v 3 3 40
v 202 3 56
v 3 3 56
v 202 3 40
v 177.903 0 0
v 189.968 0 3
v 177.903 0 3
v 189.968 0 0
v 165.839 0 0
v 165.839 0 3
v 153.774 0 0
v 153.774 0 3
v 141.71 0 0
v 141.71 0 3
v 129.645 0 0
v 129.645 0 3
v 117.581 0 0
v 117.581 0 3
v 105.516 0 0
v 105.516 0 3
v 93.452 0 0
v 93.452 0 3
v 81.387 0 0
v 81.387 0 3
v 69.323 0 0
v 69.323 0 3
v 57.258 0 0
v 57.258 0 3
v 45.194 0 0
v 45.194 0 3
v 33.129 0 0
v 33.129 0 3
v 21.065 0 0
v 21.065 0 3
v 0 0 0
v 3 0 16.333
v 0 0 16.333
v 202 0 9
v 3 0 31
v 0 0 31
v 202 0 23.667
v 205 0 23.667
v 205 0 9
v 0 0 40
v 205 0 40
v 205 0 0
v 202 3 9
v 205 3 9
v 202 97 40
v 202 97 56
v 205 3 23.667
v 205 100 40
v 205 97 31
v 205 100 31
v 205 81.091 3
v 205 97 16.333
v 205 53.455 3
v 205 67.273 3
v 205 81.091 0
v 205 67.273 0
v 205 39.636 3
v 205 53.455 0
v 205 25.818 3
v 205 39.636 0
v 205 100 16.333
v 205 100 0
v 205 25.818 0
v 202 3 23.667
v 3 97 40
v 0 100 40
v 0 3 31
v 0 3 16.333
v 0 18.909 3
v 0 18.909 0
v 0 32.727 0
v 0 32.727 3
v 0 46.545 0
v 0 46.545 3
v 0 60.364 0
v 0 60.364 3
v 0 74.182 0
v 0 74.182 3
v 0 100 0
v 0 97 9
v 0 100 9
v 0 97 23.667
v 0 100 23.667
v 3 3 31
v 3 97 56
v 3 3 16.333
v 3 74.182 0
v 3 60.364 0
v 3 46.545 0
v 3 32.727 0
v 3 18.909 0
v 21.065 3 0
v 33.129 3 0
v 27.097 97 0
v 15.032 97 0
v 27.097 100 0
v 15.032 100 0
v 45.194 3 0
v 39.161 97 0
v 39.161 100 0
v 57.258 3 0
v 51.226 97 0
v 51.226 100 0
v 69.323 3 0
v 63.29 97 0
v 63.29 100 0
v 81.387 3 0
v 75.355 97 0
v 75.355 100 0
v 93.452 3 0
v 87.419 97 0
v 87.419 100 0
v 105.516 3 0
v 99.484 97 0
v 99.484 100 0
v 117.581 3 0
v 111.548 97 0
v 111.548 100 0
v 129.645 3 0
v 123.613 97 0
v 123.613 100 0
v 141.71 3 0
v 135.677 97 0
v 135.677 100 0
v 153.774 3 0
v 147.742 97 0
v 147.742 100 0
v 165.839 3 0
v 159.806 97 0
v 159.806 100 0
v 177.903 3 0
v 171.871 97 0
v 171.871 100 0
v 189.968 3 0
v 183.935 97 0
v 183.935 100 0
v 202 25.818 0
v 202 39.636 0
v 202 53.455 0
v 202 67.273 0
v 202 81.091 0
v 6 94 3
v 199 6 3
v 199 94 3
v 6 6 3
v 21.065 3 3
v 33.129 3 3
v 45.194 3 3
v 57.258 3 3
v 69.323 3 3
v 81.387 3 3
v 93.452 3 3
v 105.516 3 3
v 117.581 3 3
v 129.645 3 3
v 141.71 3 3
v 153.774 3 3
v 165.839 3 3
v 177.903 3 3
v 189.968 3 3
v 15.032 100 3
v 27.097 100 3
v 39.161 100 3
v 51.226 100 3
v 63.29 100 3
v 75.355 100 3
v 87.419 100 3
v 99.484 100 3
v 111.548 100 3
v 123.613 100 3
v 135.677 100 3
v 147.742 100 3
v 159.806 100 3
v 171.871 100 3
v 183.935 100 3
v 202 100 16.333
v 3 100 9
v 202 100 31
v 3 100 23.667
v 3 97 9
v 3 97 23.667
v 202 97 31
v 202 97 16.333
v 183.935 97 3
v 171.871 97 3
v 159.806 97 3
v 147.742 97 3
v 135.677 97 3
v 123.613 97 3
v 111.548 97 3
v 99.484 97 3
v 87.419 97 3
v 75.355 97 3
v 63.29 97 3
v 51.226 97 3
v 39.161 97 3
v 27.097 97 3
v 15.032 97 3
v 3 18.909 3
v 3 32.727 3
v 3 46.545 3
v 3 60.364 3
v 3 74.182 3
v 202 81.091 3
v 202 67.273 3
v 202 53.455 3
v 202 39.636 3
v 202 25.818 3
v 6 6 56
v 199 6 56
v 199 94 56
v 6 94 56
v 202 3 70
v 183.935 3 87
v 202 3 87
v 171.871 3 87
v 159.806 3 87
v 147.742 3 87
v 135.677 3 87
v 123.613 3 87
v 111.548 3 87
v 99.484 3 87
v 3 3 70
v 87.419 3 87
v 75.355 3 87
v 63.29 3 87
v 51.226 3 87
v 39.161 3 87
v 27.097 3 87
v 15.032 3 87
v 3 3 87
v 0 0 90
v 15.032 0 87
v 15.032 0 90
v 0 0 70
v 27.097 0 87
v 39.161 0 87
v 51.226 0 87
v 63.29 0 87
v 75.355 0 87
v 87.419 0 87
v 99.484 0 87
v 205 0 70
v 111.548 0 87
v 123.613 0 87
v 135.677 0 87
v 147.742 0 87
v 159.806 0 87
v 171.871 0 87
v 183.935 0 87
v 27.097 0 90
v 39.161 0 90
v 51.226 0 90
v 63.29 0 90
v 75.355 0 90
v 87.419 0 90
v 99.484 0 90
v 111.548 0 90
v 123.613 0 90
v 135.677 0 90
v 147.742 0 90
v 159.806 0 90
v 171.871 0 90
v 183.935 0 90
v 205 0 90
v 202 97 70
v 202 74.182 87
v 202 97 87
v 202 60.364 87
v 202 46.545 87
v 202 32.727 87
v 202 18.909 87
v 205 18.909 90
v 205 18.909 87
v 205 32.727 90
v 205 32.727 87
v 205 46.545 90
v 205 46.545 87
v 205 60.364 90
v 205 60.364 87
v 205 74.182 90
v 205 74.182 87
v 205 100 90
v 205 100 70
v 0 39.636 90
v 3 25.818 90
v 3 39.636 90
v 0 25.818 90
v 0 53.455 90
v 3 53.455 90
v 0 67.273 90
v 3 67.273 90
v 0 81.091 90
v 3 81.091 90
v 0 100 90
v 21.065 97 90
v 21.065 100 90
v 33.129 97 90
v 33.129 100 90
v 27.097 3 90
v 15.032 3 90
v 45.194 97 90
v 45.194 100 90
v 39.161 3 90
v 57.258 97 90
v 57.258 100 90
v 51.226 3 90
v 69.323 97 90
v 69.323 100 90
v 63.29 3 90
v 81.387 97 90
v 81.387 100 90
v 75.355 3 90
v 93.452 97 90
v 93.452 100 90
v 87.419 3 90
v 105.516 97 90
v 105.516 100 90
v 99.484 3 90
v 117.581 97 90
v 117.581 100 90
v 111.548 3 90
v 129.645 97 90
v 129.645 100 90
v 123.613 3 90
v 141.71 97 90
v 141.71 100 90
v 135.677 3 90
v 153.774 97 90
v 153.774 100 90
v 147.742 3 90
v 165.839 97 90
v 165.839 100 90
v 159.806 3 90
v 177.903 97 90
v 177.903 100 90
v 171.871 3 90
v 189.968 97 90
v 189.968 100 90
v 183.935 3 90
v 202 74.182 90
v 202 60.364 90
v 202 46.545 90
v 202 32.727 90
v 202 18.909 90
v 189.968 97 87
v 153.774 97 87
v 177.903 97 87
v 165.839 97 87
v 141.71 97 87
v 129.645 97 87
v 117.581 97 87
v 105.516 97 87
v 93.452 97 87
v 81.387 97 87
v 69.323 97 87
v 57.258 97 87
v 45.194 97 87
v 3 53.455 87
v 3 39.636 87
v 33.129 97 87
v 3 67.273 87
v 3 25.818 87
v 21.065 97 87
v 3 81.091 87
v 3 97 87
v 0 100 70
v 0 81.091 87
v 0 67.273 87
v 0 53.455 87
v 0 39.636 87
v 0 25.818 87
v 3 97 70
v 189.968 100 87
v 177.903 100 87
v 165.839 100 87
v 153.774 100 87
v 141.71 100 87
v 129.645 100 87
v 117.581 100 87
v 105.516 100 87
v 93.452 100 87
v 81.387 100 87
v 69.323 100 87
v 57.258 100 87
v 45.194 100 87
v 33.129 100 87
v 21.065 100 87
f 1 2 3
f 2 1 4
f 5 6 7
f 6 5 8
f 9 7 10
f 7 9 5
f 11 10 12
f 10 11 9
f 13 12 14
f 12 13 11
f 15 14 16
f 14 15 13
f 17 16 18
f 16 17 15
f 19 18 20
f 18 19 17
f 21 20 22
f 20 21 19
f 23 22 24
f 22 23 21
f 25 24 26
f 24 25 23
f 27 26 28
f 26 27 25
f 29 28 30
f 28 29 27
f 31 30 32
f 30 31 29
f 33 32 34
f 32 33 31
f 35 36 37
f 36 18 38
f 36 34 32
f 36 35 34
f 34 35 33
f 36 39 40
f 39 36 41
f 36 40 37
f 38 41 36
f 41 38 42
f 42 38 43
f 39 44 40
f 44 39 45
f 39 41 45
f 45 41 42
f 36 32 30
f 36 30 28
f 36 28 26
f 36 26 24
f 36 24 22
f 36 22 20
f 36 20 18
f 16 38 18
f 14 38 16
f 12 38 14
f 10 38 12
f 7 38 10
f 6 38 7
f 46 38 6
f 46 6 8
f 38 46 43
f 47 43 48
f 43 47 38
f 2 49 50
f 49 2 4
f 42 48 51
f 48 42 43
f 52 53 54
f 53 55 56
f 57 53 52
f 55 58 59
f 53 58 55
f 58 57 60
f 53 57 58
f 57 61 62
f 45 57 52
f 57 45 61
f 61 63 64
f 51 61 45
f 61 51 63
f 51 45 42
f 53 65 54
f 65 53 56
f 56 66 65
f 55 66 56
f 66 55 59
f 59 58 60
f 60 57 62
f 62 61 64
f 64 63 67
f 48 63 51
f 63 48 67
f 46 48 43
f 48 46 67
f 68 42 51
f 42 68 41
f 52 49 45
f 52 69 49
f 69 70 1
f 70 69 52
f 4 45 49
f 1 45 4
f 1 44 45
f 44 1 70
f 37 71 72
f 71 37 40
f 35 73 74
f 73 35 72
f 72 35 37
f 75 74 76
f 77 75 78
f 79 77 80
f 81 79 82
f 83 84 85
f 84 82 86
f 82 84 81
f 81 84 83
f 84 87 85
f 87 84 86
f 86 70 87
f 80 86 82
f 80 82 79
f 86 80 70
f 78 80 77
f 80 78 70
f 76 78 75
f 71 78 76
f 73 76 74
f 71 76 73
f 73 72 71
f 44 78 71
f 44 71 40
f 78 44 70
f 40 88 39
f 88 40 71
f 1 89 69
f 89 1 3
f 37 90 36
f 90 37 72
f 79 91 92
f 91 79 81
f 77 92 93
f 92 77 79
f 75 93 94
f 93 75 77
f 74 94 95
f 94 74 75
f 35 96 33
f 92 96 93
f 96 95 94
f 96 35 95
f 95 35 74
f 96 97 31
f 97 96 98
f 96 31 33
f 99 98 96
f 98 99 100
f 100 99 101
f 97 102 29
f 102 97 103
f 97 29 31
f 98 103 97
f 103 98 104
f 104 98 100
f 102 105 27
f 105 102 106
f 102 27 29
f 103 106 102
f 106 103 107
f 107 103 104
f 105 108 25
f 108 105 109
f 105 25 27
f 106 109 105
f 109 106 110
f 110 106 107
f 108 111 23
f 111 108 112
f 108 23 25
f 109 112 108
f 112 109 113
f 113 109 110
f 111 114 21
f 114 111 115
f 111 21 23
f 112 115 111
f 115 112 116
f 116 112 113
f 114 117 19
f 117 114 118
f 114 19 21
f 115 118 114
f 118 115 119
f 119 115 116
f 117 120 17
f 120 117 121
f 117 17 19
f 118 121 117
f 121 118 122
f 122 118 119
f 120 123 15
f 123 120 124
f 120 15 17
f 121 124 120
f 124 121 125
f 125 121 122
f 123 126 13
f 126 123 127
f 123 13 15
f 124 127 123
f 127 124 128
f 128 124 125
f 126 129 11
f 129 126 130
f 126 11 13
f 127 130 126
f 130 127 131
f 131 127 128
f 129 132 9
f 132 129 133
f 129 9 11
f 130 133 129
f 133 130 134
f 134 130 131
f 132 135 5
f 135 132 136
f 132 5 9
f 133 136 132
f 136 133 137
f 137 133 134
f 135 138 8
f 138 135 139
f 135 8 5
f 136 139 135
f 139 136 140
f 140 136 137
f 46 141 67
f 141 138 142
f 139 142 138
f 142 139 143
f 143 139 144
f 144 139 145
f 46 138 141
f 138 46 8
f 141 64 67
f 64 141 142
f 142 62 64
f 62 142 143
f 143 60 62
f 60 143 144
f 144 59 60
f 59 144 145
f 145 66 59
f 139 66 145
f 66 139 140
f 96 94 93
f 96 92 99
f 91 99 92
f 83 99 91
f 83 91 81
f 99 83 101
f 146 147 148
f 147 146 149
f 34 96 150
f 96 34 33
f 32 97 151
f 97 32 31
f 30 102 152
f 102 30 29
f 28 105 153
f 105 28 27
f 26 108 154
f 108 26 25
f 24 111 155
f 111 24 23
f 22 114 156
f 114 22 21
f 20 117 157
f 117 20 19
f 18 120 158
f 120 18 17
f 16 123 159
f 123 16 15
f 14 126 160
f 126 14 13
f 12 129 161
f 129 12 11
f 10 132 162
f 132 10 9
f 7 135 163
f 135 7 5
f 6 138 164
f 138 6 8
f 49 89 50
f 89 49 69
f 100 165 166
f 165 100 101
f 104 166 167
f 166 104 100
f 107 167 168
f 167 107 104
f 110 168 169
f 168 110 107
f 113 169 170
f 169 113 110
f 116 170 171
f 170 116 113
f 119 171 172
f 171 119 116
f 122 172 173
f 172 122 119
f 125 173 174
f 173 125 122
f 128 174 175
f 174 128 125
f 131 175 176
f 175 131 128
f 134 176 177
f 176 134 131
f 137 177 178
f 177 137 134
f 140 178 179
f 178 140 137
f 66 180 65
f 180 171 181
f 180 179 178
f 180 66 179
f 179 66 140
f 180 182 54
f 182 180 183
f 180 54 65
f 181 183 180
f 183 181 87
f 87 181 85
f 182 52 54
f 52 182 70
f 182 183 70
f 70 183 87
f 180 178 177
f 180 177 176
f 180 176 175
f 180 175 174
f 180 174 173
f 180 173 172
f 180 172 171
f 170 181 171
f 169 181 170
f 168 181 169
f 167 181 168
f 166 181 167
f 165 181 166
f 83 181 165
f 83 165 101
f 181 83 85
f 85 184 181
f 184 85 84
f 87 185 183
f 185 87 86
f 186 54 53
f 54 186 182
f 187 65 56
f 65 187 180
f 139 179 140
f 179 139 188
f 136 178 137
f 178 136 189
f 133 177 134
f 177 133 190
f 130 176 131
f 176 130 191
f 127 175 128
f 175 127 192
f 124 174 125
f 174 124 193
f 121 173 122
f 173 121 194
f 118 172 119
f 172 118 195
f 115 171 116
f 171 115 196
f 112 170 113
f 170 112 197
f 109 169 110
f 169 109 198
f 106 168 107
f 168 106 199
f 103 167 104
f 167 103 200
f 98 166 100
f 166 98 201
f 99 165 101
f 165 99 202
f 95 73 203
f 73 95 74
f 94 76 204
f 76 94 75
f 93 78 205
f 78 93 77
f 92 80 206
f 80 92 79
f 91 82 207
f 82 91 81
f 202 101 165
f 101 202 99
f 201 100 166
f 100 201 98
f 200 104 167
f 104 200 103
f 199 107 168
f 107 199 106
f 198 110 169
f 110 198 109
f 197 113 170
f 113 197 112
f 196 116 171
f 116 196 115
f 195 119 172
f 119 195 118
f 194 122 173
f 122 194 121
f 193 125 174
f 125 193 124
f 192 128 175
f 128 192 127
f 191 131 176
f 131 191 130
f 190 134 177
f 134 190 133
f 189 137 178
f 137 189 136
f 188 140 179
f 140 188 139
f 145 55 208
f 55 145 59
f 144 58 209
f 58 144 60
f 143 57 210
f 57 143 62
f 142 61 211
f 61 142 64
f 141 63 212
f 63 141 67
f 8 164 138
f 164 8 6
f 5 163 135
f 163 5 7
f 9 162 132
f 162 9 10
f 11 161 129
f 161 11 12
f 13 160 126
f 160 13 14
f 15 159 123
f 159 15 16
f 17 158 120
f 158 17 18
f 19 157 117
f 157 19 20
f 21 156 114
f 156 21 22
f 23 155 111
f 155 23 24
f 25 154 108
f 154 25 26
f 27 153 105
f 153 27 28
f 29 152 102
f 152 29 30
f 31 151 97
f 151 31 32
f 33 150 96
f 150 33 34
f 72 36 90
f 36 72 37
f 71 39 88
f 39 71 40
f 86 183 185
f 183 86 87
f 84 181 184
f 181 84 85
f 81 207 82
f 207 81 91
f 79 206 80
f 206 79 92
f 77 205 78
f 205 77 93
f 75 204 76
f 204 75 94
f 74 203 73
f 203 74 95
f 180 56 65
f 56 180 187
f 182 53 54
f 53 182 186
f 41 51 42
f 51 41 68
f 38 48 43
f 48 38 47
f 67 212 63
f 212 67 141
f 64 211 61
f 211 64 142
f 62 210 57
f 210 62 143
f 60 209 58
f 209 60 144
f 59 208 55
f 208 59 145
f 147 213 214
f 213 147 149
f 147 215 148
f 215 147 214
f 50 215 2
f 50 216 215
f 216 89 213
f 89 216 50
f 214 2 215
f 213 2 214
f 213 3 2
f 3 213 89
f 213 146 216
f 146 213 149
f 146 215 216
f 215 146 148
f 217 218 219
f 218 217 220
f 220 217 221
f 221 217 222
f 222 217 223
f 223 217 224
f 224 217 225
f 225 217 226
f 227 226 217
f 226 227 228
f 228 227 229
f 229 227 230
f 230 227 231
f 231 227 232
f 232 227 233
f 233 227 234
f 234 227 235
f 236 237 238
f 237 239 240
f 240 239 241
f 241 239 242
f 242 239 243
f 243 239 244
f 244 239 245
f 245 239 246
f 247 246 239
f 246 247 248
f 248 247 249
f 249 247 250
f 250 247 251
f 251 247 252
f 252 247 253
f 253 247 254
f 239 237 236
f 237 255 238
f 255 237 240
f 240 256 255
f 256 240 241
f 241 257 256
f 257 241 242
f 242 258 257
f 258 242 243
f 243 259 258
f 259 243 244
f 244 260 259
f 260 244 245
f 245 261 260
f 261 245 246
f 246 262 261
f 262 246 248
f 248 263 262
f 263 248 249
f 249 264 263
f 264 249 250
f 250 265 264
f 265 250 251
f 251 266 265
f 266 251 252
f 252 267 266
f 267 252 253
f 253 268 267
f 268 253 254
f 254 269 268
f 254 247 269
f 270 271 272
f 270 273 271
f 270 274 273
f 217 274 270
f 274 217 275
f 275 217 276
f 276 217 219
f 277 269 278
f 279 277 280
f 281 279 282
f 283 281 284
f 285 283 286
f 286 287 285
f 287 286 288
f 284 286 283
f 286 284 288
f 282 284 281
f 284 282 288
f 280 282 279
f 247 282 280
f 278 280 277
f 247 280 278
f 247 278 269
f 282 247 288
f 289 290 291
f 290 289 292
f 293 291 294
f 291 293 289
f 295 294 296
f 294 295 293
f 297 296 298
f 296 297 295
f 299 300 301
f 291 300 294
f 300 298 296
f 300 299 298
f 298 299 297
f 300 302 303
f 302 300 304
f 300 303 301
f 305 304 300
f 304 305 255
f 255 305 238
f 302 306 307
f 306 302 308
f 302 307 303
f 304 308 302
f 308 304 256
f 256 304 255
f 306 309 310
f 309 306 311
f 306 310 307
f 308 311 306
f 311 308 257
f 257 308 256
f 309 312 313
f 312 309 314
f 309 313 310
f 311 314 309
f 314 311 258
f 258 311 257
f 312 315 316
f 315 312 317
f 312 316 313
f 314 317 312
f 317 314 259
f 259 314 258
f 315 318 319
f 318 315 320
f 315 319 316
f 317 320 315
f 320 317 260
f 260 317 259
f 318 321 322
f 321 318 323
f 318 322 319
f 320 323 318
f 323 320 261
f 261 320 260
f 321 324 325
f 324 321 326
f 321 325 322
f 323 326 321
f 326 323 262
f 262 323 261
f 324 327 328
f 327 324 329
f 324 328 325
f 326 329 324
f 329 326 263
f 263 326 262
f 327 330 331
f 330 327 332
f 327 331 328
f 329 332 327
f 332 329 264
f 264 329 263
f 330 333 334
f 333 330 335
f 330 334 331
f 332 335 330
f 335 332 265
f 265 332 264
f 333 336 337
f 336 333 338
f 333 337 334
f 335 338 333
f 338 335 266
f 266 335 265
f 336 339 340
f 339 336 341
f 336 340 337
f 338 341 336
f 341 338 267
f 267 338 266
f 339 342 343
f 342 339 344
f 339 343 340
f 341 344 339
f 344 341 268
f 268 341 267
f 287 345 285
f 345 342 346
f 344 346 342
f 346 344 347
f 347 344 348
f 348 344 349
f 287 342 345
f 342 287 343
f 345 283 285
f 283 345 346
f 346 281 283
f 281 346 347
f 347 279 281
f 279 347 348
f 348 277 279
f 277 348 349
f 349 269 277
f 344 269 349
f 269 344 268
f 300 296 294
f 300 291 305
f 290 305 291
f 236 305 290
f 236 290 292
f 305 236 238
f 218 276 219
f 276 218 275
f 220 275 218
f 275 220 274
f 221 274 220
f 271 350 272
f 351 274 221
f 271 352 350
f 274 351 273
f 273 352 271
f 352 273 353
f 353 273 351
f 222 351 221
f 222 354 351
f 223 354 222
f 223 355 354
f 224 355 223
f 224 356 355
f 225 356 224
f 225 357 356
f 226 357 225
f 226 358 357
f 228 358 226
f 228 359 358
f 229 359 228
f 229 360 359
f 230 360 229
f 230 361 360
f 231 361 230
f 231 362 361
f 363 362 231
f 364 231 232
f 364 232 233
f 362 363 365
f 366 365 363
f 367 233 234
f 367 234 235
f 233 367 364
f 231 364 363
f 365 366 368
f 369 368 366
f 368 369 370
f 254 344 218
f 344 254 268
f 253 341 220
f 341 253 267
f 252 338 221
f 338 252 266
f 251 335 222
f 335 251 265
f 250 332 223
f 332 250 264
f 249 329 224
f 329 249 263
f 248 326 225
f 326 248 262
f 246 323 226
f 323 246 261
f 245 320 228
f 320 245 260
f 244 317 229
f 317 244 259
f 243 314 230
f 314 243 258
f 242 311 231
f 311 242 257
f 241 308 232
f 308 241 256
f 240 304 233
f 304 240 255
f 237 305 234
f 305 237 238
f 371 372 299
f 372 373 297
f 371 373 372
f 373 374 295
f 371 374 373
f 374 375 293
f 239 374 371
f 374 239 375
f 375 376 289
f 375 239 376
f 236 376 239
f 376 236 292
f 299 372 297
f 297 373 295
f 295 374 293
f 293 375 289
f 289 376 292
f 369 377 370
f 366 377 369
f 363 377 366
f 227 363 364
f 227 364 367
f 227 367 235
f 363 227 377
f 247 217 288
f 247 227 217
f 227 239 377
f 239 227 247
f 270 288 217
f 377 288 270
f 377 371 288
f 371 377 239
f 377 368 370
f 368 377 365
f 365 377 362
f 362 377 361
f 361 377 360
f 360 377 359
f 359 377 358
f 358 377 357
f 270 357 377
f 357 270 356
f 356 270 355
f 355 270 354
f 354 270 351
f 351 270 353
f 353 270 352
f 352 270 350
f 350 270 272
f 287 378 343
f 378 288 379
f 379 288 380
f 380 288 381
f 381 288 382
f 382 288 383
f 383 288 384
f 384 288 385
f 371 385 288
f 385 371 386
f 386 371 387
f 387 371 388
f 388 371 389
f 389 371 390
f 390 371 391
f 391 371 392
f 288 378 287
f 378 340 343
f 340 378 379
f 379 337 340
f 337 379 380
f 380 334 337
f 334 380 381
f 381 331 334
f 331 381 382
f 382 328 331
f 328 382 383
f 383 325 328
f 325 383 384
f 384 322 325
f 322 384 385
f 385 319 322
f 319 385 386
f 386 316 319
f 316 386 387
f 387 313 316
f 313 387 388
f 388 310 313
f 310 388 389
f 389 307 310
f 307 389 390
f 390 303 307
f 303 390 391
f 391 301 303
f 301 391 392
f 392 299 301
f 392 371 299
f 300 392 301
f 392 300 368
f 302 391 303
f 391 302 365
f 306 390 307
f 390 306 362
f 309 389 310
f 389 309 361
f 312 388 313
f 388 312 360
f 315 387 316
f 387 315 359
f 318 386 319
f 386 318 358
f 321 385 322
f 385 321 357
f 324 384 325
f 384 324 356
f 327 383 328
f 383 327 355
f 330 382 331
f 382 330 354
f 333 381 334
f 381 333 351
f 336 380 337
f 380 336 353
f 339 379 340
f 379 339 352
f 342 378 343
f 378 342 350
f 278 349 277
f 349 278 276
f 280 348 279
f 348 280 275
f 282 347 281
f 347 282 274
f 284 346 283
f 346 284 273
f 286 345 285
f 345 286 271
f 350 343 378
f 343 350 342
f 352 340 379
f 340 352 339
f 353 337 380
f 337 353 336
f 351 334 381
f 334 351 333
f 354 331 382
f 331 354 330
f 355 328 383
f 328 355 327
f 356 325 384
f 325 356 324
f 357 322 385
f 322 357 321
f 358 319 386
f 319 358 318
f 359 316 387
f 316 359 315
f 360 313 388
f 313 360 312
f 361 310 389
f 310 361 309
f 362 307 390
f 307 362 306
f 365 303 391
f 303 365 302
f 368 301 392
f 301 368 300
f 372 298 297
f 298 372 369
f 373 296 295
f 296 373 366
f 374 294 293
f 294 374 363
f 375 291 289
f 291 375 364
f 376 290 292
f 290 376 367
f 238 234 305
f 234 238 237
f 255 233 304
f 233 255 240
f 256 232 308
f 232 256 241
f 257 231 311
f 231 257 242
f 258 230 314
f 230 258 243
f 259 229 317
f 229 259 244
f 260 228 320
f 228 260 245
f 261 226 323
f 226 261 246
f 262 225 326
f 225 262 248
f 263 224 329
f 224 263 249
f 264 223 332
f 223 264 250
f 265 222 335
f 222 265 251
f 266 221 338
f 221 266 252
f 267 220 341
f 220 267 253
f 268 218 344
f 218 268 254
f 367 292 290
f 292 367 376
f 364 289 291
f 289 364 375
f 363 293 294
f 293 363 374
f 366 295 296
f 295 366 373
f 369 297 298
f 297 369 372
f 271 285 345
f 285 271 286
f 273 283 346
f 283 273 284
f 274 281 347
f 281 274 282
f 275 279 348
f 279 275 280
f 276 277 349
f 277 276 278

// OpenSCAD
include <../box.scad>

// Dimensions are inside
inner = false;

// width
width = 205;

// height
height = 60;

// depth
depth = 100;

// material thickness
thickness = 3;

// height of lid
lid_height = 20;

// assemble on/off
assemble = true;

// spacing in 2d render
spacing = 1;

// clearance between inner lip and lid
inner_clearance = 1;

outer_box();
move_inner() inner_box();
move_lid() lid();

module outer_box() {
    box(width = width,
        height = height - lid_height,
        depth = depth,
        inner = inner,
        thickness = thickness,
        open = true, assemble = assemble,
        spacing = spacing);
}


module inner_box() {
    inner_height = inner ? height : (height - 2 * thickness);
    box(width = width - 2 * thickness,
        depth = depth - 2 * thickness,
        height = inner_height - inner_clearance,
        inner = inner,
        thickness = thickness,
        assemble = assemble,
        open = true,
        open_bottom = true,
        spacing = spacing);
}

module lid() {
    box(width = width,
        depth = depth,
        height = lid_height,
        inner = inner,
        thickness = thickness,
        open_bottom = true,
        assemble = assemble,
        spacing = spacing);
}

module move_inner() {
    if (assemble)
        translate([thickness,thickness,thickness]) children();
    else
        translate([0,width,0]) children();
}


module move_lid() {
    lid_lift = inner ? thickness : 0;
    if (assemble)
        translate([0,0,height - lid_height + lid_lift + 30]) children();
    else
        translate([0,2*width,0]) children();
}
